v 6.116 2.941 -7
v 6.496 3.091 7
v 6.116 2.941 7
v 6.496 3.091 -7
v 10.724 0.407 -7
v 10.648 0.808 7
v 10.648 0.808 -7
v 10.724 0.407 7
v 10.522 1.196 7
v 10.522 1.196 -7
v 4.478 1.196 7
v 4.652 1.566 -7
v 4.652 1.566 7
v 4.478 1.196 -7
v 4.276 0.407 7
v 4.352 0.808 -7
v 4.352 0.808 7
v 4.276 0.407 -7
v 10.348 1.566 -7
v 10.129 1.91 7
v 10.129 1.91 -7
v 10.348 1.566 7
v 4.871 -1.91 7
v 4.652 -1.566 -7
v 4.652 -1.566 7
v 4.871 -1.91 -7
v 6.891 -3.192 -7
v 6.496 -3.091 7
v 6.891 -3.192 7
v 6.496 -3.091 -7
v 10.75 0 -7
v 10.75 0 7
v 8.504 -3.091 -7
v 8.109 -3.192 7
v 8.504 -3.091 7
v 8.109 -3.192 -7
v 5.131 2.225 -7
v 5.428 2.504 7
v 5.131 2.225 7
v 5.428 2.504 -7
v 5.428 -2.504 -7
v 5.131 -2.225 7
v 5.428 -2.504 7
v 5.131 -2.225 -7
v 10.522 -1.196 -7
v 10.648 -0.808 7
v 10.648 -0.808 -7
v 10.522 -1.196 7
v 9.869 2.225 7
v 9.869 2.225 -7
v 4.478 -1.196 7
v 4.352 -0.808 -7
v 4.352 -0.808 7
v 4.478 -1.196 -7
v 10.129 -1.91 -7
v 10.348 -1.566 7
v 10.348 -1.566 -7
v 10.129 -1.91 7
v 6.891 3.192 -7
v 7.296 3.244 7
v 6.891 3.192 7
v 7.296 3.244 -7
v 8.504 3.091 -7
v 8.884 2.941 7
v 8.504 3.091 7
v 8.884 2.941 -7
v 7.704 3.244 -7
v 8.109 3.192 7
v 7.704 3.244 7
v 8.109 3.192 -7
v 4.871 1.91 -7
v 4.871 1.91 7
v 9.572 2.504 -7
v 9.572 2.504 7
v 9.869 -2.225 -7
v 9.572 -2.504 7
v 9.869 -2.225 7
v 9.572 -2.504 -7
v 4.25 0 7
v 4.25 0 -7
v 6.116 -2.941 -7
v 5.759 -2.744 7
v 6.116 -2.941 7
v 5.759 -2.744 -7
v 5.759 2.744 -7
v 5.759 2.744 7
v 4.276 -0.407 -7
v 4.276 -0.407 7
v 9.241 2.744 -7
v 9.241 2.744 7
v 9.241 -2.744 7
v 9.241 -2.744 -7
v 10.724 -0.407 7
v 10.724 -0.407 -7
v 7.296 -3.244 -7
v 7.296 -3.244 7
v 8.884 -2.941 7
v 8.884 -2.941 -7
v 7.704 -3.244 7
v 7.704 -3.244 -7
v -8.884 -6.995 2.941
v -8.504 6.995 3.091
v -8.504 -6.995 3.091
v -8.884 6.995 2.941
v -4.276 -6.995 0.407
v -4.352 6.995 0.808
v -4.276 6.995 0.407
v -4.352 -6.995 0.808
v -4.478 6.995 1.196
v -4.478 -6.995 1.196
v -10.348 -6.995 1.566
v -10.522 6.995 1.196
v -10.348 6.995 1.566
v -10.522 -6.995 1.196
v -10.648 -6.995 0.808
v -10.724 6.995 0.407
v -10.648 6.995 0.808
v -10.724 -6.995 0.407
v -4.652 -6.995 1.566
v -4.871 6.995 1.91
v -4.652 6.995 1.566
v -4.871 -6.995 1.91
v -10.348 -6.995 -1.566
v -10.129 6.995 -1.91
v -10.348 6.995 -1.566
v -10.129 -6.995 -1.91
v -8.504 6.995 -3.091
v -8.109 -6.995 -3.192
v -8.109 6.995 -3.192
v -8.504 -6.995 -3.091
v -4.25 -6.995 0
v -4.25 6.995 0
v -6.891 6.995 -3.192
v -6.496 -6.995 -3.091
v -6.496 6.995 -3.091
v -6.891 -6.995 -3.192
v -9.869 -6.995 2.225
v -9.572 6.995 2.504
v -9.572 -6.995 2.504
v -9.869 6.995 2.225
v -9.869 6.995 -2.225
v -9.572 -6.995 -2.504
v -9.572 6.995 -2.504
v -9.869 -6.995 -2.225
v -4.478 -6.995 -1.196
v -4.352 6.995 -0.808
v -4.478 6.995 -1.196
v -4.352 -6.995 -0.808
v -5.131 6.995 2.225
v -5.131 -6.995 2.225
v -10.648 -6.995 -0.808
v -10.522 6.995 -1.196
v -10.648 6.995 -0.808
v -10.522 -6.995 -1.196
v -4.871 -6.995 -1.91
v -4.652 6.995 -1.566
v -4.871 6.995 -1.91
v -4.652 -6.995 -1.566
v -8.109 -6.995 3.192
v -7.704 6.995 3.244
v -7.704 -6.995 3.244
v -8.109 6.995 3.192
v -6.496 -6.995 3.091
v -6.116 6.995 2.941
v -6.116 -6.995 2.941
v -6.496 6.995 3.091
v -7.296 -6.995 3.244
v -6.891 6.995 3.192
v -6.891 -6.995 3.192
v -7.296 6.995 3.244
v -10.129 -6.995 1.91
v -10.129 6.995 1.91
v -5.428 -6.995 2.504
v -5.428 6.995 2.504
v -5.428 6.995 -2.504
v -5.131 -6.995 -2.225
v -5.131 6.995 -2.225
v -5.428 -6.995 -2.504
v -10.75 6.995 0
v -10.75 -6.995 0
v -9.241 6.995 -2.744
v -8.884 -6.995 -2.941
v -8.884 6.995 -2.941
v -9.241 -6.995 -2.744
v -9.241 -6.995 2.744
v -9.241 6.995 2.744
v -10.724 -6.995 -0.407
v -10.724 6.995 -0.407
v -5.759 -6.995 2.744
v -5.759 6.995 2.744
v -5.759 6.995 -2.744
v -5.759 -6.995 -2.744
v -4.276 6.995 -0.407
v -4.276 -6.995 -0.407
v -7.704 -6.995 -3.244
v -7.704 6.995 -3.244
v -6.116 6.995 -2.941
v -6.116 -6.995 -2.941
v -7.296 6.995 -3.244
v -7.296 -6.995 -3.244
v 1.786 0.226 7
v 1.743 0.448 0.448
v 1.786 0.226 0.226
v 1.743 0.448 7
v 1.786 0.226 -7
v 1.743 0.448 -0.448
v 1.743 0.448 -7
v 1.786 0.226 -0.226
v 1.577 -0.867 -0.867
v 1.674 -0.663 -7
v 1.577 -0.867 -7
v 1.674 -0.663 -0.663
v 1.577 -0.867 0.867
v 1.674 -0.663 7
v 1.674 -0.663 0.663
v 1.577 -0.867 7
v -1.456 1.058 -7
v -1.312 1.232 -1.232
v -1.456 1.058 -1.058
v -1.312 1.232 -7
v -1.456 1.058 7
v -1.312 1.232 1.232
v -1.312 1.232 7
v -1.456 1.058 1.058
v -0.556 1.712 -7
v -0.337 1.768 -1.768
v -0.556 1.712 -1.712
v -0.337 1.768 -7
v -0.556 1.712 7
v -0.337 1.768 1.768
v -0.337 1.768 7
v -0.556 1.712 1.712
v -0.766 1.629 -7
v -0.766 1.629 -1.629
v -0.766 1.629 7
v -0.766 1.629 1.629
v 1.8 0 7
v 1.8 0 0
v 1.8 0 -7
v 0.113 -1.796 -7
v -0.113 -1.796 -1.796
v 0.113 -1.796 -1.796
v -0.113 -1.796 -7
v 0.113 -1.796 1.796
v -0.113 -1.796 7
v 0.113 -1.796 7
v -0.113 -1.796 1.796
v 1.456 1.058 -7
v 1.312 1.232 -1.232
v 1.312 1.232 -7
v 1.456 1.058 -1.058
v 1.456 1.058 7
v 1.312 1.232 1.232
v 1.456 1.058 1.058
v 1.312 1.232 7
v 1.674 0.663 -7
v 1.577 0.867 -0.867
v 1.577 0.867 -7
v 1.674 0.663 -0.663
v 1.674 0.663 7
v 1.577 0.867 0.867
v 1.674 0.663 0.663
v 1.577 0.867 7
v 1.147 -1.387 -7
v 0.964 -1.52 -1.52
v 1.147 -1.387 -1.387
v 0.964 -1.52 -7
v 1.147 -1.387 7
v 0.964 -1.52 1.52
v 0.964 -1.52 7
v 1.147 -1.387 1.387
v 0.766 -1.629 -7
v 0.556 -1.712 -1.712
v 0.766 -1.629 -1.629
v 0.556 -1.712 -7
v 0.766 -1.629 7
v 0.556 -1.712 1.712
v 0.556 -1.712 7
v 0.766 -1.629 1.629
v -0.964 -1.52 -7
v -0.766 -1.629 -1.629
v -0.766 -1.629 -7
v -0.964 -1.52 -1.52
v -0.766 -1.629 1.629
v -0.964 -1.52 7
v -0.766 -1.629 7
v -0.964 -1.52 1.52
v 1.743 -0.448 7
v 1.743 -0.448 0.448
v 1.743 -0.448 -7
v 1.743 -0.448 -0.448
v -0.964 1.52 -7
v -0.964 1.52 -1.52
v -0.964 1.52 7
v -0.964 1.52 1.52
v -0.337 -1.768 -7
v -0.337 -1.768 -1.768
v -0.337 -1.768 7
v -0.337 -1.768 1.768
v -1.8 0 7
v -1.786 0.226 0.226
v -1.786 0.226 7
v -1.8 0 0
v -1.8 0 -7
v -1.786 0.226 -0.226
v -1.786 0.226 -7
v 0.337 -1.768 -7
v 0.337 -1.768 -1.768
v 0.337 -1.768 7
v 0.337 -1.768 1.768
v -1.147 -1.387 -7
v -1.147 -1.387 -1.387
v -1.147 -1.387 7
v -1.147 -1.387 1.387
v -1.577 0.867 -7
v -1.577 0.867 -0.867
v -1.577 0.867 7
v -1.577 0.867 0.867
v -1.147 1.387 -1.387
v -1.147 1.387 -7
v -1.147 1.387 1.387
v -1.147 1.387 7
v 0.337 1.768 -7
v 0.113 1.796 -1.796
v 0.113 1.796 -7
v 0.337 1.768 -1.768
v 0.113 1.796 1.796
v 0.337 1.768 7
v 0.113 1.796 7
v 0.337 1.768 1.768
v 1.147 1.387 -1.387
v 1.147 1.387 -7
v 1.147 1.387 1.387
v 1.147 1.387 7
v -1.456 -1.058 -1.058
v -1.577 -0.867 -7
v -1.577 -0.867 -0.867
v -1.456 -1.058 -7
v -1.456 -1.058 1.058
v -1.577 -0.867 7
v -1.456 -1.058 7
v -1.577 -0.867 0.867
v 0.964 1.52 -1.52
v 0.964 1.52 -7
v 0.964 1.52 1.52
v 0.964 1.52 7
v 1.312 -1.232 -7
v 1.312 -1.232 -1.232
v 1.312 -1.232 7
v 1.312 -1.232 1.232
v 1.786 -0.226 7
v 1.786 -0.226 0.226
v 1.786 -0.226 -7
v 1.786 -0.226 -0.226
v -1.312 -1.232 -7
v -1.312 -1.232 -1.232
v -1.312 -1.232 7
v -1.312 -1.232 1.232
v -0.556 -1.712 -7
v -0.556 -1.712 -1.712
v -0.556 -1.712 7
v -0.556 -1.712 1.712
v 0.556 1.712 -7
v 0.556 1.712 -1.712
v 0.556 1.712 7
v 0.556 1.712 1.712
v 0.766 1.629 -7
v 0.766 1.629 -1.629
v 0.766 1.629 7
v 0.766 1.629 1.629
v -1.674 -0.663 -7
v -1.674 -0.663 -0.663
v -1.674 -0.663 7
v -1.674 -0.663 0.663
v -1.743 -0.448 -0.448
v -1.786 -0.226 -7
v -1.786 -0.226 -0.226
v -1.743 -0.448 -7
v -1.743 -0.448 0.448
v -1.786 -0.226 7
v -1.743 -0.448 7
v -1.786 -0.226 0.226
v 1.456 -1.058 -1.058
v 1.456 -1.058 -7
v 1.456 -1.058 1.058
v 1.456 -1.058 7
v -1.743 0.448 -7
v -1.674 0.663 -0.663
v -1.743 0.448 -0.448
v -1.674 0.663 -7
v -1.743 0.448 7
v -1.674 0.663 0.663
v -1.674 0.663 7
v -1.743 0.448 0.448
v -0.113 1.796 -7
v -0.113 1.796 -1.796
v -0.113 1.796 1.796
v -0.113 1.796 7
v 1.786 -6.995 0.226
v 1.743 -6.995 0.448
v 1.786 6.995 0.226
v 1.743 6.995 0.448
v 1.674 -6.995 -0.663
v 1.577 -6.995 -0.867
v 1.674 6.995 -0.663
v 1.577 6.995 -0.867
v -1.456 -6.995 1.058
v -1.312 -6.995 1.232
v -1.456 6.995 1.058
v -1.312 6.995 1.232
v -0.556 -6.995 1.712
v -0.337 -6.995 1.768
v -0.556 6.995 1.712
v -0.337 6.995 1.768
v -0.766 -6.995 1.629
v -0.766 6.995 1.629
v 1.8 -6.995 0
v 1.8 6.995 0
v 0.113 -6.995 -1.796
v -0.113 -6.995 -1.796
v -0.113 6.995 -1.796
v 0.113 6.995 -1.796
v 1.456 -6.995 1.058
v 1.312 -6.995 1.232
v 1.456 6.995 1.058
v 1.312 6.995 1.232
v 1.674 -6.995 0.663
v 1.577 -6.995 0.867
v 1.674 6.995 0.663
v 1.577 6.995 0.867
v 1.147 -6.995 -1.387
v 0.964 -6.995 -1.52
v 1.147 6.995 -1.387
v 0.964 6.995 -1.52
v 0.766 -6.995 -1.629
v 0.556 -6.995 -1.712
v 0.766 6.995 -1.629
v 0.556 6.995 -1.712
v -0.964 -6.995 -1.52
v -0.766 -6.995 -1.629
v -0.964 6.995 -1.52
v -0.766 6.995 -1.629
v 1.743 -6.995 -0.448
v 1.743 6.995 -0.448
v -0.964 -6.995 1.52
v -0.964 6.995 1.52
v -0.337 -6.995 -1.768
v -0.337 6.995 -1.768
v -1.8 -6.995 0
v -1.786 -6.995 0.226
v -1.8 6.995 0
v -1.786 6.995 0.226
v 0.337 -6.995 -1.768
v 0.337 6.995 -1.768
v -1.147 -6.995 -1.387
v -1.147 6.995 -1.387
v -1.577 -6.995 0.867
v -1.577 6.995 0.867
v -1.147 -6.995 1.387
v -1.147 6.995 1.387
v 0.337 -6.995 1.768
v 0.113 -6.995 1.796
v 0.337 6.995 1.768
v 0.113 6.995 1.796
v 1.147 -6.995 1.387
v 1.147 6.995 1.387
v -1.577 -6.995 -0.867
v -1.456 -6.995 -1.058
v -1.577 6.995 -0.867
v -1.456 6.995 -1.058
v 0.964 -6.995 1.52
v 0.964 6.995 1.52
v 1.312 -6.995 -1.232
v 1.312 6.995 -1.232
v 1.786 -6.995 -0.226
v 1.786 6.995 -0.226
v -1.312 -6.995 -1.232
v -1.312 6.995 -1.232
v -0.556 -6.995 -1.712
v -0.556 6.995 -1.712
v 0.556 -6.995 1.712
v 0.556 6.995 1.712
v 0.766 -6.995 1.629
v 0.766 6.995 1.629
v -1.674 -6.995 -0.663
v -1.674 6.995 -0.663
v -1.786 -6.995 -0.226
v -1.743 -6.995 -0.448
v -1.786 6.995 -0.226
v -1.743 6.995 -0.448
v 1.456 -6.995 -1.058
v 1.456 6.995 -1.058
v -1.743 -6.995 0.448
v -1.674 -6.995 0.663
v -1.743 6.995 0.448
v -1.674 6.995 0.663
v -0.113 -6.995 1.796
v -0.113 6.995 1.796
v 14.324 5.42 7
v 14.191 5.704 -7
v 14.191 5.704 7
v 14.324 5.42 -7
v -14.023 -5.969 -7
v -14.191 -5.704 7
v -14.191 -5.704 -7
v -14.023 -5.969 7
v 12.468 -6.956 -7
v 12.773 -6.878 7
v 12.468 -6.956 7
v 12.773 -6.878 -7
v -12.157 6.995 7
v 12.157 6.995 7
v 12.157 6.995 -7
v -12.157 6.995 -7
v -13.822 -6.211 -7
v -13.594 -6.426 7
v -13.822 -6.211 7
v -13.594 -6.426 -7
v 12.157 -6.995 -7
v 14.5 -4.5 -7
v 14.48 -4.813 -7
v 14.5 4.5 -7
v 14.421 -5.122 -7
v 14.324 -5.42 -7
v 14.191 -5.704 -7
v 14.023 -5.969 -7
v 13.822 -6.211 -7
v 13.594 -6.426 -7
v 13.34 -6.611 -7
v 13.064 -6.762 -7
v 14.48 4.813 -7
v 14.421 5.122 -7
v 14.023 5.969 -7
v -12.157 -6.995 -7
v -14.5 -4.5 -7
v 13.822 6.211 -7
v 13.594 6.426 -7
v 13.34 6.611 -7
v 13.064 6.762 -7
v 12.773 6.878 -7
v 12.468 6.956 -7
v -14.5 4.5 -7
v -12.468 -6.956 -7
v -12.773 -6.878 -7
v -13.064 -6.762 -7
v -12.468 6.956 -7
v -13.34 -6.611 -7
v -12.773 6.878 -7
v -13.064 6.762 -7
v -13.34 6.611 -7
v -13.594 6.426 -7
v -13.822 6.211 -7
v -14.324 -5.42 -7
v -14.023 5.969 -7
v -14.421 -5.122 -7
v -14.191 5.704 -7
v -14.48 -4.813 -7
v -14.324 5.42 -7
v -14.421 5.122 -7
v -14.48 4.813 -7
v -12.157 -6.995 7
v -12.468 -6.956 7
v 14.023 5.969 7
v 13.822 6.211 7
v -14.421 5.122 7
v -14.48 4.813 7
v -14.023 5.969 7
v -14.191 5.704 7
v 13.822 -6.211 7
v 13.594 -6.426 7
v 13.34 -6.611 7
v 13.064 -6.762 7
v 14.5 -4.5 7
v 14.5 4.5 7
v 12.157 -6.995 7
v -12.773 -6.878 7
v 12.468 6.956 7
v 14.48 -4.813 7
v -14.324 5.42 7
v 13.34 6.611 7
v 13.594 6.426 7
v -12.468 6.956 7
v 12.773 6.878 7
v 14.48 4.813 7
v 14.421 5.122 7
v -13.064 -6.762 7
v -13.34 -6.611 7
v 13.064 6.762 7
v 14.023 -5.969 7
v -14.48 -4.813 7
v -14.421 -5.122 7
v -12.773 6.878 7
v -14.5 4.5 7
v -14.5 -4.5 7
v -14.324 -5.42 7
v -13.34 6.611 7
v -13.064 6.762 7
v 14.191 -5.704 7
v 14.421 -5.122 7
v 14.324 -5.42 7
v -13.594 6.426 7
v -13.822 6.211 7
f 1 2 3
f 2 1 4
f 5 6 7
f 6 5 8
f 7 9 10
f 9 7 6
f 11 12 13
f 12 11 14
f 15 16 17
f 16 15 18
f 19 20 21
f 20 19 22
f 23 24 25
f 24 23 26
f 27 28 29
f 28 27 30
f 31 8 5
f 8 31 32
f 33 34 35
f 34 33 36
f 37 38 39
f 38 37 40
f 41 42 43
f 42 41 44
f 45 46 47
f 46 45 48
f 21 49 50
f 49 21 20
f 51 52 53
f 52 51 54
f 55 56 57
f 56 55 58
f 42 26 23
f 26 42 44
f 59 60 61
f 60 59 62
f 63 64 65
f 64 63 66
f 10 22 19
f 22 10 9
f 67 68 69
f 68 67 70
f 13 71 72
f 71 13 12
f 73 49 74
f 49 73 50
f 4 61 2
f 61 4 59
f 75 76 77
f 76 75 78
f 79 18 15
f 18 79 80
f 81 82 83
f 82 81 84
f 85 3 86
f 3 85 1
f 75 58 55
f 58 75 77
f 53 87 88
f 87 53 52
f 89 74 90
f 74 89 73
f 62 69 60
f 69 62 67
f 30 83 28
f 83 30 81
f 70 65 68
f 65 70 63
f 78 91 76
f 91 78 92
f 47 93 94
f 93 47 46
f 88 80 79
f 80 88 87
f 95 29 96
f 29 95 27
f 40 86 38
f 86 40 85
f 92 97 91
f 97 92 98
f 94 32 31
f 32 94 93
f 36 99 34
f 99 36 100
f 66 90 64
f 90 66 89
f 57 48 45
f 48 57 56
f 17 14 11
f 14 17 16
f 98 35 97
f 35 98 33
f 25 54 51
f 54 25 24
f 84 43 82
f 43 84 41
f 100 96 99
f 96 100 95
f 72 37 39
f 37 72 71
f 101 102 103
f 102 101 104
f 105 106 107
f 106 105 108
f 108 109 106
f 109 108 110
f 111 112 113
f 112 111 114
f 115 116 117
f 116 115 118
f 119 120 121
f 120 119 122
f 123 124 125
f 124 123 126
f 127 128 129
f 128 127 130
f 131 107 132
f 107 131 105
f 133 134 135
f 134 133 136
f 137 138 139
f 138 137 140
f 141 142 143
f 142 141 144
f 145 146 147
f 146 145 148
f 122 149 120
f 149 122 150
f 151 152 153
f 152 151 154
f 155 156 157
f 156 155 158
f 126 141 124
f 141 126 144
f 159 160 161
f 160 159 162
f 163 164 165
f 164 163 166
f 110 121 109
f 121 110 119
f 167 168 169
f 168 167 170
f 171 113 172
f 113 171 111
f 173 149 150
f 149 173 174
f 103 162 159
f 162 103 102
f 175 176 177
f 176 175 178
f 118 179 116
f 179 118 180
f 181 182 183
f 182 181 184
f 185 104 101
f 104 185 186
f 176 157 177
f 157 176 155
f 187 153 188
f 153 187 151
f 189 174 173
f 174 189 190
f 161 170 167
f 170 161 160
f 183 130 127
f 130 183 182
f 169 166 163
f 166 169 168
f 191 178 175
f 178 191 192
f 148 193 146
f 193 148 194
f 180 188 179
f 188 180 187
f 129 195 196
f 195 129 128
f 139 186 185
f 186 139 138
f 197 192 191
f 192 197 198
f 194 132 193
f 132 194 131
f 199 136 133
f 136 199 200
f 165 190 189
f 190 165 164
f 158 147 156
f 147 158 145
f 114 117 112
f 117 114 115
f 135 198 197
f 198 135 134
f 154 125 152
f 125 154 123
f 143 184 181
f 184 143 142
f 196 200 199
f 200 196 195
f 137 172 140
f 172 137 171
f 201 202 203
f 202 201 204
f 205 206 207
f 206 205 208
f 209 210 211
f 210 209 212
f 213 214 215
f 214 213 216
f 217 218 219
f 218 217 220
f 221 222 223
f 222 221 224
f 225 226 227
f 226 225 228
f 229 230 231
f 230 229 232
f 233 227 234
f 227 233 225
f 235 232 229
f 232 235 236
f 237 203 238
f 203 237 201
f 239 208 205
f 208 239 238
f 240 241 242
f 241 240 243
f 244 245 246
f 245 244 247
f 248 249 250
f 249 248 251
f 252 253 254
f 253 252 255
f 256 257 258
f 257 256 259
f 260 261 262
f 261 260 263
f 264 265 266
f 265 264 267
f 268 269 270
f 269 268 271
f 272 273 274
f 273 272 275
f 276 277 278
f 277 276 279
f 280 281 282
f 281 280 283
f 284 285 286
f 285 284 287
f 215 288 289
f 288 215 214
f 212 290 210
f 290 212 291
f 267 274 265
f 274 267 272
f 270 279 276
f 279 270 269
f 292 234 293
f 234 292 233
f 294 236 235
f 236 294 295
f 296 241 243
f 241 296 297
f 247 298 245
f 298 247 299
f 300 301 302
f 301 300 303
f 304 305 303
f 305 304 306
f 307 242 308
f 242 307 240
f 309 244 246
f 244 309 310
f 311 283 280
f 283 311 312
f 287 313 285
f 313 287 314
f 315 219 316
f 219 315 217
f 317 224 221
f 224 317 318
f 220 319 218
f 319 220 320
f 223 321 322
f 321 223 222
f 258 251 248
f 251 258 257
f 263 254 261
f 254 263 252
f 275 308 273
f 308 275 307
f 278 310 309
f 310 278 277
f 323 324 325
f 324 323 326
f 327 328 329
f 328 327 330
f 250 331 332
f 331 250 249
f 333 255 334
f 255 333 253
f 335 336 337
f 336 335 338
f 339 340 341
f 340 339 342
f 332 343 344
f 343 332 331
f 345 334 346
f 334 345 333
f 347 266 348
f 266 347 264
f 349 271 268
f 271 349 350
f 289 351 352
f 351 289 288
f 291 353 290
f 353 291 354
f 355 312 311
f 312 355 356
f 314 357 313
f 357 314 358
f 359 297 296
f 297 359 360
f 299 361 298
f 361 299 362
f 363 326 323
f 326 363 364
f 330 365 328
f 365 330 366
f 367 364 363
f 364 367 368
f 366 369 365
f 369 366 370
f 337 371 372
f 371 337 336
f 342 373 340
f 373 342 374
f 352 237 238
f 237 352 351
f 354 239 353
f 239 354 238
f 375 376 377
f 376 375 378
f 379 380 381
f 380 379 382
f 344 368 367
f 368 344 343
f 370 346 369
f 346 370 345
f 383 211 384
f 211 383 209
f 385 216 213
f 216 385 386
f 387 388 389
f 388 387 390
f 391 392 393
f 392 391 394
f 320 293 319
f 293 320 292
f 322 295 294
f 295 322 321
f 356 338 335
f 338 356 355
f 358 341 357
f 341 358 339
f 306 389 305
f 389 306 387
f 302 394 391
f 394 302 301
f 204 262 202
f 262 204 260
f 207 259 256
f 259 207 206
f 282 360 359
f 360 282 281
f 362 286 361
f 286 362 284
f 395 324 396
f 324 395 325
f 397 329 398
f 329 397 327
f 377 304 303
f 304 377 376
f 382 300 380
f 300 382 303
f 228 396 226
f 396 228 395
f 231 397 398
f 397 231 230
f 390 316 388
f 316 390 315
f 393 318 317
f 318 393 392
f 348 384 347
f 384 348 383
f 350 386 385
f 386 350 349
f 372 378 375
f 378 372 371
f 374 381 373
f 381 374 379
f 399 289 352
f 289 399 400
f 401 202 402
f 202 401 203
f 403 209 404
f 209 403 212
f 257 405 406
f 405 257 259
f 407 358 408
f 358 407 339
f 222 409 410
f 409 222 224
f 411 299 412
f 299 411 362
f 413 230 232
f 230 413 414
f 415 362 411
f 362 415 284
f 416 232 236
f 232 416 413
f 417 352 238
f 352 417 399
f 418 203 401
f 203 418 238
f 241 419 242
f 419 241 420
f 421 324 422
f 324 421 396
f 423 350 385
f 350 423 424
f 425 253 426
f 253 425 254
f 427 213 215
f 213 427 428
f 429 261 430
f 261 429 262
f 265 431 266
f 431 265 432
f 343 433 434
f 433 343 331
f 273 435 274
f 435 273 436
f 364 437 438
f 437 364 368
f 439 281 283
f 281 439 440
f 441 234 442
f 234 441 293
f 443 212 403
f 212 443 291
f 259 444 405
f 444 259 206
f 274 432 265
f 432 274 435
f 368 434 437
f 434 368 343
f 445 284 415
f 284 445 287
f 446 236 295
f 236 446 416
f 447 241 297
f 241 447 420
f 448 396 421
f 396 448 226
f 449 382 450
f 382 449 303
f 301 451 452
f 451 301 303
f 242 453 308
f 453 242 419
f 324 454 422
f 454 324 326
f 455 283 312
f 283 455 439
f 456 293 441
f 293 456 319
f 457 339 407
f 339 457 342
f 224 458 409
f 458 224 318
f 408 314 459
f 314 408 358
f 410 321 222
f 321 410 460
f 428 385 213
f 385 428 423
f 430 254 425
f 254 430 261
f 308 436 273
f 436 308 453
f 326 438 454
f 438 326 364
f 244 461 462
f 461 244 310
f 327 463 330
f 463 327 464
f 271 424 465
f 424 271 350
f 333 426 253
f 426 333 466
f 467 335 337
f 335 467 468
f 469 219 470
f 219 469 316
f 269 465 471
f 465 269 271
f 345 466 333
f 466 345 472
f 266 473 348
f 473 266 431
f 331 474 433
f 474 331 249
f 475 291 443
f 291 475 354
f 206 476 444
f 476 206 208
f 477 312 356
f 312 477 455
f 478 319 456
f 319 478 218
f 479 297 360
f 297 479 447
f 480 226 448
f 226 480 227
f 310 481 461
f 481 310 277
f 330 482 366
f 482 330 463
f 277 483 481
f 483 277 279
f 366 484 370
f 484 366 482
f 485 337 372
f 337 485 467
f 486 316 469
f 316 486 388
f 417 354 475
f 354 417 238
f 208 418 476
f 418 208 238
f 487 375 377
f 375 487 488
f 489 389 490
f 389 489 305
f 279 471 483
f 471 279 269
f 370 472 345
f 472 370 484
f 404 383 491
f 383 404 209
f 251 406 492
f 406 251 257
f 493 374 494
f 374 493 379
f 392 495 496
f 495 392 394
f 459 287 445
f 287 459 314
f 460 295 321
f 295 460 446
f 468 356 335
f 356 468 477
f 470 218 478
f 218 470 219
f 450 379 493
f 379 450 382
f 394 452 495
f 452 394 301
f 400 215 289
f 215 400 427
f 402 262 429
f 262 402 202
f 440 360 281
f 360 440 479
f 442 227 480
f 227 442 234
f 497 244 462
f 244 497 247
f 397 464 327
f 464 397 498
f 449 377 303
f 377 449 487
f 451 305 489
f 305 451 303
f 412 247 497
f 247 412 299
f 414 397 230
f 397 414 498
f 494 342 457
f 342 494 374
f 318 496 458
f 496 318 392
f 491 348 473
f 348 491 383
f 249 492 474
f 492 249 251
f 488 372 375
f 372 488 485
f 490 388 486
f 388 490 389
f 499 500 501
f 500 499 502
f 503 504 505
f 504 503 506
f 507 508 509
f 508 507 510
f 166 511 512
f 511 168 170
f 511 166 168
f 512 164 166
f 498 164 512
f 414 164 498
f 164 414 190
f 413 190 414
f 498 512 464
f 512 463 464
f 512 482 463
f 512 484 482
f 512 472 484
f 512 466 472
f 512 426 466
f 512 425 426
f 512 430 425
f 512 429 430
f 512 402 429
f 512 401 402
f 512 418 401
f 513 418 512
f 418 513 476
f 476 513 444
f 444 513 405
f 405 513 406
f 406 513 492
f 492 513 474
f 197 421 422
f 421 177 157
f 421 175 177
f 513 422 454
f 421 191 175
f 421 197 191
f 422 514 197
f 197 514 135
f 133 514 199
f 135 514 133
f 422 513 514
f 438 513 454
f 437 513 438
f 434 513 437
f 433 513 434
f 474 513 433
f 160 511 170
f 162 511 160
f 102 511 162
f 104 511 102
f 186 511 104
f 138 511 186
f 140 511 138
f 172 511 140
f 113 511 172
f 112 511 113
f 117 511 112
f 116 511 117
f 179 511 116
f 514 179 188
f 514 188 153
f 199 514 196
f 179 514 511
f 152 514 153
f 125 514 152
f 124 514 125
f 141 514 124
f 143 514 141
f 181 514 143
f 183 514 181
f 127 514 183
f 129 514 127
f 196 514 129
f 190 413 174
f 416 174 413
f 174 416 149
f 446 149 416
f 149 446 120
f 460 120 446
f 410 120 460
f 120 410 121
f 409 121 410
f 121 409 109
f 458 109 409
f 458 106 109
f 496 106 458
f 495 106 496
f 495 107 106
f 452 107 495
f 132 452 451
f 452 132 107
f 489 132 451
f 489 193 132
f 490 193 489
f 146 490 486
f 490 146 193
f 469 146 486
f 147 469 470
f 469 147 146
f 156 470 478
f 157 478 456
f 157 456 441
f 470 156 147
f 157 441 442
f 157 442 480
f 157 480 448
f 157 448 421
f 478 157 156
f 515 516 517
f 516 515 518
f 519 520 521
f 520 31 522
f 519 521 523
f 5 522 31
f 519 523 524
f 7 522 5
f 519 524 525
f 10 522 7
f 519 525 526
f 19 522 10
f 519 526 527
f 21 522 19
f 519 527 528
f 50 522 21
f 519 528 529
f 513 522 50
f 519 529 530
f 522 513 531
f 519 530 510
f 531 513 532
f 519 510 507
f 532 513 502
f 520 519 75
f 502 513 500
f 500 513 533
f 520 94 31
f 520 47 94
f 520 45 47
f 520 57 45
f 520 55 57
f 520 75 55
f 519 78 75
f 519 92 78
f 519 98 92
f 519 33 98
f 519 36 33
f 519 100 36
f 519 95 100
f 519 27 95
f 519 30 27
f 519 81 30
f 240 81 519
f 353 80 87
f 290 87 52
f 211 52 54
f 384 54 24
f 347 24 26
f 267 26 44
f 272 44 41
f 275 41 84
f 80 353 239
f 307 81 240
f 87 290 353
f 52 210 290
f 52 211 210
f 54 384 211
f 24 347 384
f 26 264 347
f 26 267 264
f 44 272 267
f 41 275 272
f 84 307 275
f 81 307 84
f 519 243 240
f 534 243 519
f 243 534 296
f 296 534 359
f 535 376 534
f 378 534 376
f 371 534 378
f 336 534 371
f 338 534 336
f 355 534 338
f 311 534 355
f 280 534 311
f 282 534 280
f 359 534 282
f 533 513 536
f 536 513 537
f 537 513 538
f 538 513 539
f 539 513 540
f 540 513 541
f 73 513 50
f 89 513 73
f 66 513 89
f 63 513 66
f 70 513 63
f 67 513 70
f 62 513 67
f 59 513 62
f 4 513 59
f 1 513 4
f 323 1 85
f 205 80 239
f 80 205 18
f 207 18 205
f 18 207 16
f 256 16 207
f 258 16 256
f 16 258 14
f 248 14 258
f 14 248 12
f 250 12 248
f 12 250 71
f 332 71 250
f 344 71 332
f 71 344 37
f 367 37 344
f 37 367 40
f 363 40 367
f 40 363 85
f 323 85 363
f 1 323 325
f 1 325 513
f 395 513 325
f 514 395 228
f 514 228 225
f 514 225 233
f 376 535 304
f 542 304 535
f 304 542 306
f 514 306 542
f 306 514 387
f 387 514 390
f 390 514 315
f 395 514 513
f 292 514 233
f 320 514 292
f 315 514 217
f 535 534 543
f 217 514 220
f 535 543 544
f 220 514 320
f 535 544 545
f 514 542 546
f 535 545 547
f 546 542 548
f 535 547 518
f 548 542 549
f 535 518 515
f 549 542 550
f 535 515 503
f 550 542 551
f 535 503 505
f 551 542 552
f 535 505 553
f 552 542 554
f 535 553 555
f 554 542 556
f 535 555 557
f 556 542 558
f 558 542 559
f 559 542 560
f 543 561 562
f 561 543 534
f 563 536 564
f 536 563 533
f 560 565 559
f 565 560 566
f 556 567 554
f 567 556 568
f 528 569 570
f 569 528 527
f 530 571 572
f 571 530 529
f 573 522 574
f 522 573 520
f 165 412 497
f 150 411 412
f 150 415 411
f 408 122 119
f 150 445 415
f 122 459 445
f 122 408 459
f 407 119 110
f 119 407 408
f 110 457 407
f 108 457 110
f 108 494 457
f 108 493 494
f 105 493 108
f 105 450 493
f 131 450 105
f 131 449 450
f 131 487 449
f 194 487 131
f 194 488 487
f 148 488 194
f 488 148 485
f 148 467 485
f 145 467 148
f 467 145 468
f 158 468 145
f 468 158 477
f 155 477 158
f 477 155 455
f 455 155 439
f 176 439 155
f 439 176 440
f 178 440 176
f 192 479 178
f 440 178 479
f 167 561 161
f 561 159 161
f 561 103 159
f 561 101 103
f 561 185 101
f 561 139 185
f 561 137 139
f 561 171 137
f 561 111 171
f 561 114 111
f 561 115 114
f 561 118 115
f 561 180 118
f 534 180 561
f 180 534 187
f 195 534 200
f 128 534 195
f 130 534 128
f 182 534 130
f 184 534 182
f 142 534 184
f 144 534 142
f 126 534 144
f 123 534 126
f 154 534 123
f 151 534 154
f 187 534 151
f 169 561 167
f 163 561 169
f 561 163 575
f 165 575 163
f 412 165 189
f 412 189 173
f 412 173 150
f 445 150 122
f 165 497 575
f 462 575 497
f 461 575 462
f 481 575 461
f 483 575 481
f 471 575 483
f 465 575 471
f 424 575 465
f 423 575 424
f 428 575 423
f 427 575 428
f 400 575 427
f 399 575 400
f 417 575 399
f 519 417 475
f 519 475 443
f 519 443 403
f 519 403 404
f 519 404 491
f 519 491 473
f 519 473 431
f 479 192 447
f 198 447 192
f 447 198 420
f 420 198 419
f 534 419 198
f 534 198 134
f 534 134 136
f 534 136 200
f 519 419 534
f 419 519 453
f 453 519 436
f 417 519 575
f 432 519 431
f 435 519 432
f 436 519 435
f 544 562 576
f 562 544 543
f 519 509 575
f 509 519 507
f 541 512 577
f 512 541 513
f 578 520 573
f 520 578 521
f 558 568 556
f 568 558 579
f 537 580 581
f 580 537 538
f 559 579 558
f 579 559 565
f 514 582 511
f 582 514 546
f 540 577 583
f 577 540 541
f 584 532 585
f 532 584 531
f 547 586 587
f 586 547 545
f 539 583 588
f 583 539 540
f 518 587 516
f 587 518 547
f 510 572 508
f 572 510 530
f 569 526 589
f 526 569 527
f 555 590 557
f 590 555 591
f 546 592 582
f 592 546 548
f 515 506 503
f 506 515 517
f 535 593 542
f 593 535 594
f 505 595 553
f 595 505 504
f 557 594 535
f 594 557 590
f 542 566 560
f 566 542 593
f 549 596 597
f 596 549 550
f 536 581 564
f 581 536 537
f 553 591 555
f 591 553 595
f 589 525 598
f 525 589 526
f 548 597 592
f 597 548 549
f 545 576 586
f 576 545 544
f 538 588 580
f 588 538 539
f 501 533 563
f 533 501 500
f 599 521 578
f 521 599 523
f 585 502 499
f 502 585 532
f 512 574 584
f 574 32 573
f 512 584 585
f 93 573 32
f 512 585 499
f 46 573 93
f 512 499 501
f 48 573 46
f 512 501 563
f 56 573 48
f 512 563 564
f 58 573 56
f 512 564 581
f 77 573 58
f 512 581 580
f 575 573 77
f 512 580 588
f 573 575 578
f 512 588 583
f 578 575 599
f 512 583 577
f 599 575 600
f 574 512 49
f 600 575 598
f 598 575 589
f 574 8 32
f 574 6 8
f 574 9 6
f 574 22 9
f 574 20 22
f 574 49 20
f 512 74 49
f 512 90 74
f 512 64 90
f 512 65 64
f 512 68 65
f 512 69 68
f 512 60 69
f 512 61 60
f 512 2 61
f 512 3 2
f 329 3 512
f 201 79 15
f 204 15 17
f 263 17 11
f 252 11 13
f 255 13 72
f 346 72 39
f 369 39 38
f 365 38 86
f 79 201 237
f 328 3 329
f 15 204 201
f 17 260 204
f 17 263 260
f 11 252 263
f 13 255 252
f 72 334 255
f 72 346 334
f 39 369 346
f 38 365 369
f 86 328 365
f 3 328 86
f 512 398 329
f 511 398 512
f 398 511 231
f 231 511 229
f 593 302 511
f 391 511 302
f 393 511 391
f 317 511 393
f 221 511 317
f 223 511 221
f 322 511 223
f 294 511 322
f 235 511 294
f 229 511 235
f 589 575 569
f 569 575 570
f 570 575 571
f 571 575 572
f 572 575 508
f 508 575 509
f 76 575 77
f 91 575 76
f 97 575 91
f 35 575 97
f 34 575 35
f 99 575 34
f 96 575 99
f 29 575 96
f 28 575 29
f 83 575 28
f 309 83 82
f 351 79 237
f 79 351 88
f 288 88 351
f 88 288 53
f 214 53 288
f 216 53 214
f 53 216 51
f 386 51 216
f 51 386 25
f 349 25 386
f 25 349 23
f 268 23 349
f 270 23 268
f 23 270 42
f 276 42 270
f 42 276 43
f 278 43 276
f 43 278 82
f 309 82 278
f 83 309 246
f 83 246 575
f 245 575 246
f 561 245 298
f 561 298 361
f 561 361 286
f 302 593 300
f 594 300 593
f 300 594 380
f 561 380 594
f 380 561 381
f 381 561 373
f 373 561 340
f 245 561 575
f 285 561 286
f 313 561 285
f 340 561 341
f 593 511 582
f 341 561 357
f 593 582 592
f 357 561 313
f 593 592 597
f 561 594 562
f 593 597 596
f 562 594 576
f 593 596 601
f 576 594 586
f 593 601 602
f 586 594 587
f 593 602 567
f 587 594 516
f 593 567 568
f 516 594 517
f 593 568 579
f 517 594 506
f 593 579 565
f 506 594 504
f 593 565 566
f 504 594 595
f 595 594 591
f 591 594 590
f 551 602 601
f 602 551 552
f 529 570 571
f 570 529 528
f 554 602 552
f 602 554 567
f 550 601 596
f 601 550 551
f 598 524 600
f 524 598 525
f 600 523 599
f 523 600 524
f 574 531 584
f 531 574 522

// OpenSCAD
$fn = 50;


difference() {
	union() {
		*color(alpha = 1.0000000000, c = "gray") {
			translate(v = [0, 7, 0]) {
				linear_extrude(height = 1) {
					text(font = "Arial:style=Bold", halign = "center", size = 4.5000000000, text = "COMMENT plate main", valign = "center");
				}
			}
		}
		translate(v = [0, 0, -7.0000000000]) {
			hull() {
				translate(v = [-12.0000000000, 4.5000000000, 0]) {
					cylinder(h = 14, r = 2.5000000000);
				}
				translate(v = [12.0000000000, 4.5000000000, 0]) {
					cylinder(h = 14, r = 2.5000000000);
				}
				translate(v = [-12.0000000000, -4.5000000000, 0]) {
					cylinder(h = 14, r = 2.5000000000);
				}
				translate(v = [12.0000000000, -4.5000000000, 0]) {
					cylinder(h = 14, r = 2.5000000000);
				}
			}
		}
	}
	union() {
		translate(v = [7.5000000000, 0.0000000000, 0.0000000000]) {
			rotate(a = [0, 0, 0]) {
				difference() {
					union() {
						translate(v = [0, 0, -125.0000000000]) {
							cylinder(h = 250, r = 3.2500000000);
						}
					}
					union();
				}
			}
		}
		translate(v = [-7.5000000000, 0.0000000000, 0.0000000000]) {
			rotate(a = [90, 0, 0]) {
				difference() {
					union() {
						translate(v = [0, 0, -125.0000000000]) {
							cylinder(h = 250, r = 3.2500000000);
						}
					}
					union();
				}
			}
		}
		translate(v = [0.0000000000, 0.0000000000, 0.0000000000]) {
			rotate(a = [0, 0, 0]) {
				difference() {
					union() {
						translate(v = [0, 0, -125.0000000000]) {
							cylinder(h = 250, r = 1.8000000000);
						}
					}
					union();
				}
			}
		}
		translate(v = [0.0000000000, 0.0000000000, 0.0000000000]) {
			rotate(a = [90, 0, 0]) {
				difference() {
					union() {
						translate(v = [0, 0, -125.0000000000]) {
							cylinder(h = 250, r = 1.8000000000);
						}
					}
					union();
				}
			}
		}
	}
}
